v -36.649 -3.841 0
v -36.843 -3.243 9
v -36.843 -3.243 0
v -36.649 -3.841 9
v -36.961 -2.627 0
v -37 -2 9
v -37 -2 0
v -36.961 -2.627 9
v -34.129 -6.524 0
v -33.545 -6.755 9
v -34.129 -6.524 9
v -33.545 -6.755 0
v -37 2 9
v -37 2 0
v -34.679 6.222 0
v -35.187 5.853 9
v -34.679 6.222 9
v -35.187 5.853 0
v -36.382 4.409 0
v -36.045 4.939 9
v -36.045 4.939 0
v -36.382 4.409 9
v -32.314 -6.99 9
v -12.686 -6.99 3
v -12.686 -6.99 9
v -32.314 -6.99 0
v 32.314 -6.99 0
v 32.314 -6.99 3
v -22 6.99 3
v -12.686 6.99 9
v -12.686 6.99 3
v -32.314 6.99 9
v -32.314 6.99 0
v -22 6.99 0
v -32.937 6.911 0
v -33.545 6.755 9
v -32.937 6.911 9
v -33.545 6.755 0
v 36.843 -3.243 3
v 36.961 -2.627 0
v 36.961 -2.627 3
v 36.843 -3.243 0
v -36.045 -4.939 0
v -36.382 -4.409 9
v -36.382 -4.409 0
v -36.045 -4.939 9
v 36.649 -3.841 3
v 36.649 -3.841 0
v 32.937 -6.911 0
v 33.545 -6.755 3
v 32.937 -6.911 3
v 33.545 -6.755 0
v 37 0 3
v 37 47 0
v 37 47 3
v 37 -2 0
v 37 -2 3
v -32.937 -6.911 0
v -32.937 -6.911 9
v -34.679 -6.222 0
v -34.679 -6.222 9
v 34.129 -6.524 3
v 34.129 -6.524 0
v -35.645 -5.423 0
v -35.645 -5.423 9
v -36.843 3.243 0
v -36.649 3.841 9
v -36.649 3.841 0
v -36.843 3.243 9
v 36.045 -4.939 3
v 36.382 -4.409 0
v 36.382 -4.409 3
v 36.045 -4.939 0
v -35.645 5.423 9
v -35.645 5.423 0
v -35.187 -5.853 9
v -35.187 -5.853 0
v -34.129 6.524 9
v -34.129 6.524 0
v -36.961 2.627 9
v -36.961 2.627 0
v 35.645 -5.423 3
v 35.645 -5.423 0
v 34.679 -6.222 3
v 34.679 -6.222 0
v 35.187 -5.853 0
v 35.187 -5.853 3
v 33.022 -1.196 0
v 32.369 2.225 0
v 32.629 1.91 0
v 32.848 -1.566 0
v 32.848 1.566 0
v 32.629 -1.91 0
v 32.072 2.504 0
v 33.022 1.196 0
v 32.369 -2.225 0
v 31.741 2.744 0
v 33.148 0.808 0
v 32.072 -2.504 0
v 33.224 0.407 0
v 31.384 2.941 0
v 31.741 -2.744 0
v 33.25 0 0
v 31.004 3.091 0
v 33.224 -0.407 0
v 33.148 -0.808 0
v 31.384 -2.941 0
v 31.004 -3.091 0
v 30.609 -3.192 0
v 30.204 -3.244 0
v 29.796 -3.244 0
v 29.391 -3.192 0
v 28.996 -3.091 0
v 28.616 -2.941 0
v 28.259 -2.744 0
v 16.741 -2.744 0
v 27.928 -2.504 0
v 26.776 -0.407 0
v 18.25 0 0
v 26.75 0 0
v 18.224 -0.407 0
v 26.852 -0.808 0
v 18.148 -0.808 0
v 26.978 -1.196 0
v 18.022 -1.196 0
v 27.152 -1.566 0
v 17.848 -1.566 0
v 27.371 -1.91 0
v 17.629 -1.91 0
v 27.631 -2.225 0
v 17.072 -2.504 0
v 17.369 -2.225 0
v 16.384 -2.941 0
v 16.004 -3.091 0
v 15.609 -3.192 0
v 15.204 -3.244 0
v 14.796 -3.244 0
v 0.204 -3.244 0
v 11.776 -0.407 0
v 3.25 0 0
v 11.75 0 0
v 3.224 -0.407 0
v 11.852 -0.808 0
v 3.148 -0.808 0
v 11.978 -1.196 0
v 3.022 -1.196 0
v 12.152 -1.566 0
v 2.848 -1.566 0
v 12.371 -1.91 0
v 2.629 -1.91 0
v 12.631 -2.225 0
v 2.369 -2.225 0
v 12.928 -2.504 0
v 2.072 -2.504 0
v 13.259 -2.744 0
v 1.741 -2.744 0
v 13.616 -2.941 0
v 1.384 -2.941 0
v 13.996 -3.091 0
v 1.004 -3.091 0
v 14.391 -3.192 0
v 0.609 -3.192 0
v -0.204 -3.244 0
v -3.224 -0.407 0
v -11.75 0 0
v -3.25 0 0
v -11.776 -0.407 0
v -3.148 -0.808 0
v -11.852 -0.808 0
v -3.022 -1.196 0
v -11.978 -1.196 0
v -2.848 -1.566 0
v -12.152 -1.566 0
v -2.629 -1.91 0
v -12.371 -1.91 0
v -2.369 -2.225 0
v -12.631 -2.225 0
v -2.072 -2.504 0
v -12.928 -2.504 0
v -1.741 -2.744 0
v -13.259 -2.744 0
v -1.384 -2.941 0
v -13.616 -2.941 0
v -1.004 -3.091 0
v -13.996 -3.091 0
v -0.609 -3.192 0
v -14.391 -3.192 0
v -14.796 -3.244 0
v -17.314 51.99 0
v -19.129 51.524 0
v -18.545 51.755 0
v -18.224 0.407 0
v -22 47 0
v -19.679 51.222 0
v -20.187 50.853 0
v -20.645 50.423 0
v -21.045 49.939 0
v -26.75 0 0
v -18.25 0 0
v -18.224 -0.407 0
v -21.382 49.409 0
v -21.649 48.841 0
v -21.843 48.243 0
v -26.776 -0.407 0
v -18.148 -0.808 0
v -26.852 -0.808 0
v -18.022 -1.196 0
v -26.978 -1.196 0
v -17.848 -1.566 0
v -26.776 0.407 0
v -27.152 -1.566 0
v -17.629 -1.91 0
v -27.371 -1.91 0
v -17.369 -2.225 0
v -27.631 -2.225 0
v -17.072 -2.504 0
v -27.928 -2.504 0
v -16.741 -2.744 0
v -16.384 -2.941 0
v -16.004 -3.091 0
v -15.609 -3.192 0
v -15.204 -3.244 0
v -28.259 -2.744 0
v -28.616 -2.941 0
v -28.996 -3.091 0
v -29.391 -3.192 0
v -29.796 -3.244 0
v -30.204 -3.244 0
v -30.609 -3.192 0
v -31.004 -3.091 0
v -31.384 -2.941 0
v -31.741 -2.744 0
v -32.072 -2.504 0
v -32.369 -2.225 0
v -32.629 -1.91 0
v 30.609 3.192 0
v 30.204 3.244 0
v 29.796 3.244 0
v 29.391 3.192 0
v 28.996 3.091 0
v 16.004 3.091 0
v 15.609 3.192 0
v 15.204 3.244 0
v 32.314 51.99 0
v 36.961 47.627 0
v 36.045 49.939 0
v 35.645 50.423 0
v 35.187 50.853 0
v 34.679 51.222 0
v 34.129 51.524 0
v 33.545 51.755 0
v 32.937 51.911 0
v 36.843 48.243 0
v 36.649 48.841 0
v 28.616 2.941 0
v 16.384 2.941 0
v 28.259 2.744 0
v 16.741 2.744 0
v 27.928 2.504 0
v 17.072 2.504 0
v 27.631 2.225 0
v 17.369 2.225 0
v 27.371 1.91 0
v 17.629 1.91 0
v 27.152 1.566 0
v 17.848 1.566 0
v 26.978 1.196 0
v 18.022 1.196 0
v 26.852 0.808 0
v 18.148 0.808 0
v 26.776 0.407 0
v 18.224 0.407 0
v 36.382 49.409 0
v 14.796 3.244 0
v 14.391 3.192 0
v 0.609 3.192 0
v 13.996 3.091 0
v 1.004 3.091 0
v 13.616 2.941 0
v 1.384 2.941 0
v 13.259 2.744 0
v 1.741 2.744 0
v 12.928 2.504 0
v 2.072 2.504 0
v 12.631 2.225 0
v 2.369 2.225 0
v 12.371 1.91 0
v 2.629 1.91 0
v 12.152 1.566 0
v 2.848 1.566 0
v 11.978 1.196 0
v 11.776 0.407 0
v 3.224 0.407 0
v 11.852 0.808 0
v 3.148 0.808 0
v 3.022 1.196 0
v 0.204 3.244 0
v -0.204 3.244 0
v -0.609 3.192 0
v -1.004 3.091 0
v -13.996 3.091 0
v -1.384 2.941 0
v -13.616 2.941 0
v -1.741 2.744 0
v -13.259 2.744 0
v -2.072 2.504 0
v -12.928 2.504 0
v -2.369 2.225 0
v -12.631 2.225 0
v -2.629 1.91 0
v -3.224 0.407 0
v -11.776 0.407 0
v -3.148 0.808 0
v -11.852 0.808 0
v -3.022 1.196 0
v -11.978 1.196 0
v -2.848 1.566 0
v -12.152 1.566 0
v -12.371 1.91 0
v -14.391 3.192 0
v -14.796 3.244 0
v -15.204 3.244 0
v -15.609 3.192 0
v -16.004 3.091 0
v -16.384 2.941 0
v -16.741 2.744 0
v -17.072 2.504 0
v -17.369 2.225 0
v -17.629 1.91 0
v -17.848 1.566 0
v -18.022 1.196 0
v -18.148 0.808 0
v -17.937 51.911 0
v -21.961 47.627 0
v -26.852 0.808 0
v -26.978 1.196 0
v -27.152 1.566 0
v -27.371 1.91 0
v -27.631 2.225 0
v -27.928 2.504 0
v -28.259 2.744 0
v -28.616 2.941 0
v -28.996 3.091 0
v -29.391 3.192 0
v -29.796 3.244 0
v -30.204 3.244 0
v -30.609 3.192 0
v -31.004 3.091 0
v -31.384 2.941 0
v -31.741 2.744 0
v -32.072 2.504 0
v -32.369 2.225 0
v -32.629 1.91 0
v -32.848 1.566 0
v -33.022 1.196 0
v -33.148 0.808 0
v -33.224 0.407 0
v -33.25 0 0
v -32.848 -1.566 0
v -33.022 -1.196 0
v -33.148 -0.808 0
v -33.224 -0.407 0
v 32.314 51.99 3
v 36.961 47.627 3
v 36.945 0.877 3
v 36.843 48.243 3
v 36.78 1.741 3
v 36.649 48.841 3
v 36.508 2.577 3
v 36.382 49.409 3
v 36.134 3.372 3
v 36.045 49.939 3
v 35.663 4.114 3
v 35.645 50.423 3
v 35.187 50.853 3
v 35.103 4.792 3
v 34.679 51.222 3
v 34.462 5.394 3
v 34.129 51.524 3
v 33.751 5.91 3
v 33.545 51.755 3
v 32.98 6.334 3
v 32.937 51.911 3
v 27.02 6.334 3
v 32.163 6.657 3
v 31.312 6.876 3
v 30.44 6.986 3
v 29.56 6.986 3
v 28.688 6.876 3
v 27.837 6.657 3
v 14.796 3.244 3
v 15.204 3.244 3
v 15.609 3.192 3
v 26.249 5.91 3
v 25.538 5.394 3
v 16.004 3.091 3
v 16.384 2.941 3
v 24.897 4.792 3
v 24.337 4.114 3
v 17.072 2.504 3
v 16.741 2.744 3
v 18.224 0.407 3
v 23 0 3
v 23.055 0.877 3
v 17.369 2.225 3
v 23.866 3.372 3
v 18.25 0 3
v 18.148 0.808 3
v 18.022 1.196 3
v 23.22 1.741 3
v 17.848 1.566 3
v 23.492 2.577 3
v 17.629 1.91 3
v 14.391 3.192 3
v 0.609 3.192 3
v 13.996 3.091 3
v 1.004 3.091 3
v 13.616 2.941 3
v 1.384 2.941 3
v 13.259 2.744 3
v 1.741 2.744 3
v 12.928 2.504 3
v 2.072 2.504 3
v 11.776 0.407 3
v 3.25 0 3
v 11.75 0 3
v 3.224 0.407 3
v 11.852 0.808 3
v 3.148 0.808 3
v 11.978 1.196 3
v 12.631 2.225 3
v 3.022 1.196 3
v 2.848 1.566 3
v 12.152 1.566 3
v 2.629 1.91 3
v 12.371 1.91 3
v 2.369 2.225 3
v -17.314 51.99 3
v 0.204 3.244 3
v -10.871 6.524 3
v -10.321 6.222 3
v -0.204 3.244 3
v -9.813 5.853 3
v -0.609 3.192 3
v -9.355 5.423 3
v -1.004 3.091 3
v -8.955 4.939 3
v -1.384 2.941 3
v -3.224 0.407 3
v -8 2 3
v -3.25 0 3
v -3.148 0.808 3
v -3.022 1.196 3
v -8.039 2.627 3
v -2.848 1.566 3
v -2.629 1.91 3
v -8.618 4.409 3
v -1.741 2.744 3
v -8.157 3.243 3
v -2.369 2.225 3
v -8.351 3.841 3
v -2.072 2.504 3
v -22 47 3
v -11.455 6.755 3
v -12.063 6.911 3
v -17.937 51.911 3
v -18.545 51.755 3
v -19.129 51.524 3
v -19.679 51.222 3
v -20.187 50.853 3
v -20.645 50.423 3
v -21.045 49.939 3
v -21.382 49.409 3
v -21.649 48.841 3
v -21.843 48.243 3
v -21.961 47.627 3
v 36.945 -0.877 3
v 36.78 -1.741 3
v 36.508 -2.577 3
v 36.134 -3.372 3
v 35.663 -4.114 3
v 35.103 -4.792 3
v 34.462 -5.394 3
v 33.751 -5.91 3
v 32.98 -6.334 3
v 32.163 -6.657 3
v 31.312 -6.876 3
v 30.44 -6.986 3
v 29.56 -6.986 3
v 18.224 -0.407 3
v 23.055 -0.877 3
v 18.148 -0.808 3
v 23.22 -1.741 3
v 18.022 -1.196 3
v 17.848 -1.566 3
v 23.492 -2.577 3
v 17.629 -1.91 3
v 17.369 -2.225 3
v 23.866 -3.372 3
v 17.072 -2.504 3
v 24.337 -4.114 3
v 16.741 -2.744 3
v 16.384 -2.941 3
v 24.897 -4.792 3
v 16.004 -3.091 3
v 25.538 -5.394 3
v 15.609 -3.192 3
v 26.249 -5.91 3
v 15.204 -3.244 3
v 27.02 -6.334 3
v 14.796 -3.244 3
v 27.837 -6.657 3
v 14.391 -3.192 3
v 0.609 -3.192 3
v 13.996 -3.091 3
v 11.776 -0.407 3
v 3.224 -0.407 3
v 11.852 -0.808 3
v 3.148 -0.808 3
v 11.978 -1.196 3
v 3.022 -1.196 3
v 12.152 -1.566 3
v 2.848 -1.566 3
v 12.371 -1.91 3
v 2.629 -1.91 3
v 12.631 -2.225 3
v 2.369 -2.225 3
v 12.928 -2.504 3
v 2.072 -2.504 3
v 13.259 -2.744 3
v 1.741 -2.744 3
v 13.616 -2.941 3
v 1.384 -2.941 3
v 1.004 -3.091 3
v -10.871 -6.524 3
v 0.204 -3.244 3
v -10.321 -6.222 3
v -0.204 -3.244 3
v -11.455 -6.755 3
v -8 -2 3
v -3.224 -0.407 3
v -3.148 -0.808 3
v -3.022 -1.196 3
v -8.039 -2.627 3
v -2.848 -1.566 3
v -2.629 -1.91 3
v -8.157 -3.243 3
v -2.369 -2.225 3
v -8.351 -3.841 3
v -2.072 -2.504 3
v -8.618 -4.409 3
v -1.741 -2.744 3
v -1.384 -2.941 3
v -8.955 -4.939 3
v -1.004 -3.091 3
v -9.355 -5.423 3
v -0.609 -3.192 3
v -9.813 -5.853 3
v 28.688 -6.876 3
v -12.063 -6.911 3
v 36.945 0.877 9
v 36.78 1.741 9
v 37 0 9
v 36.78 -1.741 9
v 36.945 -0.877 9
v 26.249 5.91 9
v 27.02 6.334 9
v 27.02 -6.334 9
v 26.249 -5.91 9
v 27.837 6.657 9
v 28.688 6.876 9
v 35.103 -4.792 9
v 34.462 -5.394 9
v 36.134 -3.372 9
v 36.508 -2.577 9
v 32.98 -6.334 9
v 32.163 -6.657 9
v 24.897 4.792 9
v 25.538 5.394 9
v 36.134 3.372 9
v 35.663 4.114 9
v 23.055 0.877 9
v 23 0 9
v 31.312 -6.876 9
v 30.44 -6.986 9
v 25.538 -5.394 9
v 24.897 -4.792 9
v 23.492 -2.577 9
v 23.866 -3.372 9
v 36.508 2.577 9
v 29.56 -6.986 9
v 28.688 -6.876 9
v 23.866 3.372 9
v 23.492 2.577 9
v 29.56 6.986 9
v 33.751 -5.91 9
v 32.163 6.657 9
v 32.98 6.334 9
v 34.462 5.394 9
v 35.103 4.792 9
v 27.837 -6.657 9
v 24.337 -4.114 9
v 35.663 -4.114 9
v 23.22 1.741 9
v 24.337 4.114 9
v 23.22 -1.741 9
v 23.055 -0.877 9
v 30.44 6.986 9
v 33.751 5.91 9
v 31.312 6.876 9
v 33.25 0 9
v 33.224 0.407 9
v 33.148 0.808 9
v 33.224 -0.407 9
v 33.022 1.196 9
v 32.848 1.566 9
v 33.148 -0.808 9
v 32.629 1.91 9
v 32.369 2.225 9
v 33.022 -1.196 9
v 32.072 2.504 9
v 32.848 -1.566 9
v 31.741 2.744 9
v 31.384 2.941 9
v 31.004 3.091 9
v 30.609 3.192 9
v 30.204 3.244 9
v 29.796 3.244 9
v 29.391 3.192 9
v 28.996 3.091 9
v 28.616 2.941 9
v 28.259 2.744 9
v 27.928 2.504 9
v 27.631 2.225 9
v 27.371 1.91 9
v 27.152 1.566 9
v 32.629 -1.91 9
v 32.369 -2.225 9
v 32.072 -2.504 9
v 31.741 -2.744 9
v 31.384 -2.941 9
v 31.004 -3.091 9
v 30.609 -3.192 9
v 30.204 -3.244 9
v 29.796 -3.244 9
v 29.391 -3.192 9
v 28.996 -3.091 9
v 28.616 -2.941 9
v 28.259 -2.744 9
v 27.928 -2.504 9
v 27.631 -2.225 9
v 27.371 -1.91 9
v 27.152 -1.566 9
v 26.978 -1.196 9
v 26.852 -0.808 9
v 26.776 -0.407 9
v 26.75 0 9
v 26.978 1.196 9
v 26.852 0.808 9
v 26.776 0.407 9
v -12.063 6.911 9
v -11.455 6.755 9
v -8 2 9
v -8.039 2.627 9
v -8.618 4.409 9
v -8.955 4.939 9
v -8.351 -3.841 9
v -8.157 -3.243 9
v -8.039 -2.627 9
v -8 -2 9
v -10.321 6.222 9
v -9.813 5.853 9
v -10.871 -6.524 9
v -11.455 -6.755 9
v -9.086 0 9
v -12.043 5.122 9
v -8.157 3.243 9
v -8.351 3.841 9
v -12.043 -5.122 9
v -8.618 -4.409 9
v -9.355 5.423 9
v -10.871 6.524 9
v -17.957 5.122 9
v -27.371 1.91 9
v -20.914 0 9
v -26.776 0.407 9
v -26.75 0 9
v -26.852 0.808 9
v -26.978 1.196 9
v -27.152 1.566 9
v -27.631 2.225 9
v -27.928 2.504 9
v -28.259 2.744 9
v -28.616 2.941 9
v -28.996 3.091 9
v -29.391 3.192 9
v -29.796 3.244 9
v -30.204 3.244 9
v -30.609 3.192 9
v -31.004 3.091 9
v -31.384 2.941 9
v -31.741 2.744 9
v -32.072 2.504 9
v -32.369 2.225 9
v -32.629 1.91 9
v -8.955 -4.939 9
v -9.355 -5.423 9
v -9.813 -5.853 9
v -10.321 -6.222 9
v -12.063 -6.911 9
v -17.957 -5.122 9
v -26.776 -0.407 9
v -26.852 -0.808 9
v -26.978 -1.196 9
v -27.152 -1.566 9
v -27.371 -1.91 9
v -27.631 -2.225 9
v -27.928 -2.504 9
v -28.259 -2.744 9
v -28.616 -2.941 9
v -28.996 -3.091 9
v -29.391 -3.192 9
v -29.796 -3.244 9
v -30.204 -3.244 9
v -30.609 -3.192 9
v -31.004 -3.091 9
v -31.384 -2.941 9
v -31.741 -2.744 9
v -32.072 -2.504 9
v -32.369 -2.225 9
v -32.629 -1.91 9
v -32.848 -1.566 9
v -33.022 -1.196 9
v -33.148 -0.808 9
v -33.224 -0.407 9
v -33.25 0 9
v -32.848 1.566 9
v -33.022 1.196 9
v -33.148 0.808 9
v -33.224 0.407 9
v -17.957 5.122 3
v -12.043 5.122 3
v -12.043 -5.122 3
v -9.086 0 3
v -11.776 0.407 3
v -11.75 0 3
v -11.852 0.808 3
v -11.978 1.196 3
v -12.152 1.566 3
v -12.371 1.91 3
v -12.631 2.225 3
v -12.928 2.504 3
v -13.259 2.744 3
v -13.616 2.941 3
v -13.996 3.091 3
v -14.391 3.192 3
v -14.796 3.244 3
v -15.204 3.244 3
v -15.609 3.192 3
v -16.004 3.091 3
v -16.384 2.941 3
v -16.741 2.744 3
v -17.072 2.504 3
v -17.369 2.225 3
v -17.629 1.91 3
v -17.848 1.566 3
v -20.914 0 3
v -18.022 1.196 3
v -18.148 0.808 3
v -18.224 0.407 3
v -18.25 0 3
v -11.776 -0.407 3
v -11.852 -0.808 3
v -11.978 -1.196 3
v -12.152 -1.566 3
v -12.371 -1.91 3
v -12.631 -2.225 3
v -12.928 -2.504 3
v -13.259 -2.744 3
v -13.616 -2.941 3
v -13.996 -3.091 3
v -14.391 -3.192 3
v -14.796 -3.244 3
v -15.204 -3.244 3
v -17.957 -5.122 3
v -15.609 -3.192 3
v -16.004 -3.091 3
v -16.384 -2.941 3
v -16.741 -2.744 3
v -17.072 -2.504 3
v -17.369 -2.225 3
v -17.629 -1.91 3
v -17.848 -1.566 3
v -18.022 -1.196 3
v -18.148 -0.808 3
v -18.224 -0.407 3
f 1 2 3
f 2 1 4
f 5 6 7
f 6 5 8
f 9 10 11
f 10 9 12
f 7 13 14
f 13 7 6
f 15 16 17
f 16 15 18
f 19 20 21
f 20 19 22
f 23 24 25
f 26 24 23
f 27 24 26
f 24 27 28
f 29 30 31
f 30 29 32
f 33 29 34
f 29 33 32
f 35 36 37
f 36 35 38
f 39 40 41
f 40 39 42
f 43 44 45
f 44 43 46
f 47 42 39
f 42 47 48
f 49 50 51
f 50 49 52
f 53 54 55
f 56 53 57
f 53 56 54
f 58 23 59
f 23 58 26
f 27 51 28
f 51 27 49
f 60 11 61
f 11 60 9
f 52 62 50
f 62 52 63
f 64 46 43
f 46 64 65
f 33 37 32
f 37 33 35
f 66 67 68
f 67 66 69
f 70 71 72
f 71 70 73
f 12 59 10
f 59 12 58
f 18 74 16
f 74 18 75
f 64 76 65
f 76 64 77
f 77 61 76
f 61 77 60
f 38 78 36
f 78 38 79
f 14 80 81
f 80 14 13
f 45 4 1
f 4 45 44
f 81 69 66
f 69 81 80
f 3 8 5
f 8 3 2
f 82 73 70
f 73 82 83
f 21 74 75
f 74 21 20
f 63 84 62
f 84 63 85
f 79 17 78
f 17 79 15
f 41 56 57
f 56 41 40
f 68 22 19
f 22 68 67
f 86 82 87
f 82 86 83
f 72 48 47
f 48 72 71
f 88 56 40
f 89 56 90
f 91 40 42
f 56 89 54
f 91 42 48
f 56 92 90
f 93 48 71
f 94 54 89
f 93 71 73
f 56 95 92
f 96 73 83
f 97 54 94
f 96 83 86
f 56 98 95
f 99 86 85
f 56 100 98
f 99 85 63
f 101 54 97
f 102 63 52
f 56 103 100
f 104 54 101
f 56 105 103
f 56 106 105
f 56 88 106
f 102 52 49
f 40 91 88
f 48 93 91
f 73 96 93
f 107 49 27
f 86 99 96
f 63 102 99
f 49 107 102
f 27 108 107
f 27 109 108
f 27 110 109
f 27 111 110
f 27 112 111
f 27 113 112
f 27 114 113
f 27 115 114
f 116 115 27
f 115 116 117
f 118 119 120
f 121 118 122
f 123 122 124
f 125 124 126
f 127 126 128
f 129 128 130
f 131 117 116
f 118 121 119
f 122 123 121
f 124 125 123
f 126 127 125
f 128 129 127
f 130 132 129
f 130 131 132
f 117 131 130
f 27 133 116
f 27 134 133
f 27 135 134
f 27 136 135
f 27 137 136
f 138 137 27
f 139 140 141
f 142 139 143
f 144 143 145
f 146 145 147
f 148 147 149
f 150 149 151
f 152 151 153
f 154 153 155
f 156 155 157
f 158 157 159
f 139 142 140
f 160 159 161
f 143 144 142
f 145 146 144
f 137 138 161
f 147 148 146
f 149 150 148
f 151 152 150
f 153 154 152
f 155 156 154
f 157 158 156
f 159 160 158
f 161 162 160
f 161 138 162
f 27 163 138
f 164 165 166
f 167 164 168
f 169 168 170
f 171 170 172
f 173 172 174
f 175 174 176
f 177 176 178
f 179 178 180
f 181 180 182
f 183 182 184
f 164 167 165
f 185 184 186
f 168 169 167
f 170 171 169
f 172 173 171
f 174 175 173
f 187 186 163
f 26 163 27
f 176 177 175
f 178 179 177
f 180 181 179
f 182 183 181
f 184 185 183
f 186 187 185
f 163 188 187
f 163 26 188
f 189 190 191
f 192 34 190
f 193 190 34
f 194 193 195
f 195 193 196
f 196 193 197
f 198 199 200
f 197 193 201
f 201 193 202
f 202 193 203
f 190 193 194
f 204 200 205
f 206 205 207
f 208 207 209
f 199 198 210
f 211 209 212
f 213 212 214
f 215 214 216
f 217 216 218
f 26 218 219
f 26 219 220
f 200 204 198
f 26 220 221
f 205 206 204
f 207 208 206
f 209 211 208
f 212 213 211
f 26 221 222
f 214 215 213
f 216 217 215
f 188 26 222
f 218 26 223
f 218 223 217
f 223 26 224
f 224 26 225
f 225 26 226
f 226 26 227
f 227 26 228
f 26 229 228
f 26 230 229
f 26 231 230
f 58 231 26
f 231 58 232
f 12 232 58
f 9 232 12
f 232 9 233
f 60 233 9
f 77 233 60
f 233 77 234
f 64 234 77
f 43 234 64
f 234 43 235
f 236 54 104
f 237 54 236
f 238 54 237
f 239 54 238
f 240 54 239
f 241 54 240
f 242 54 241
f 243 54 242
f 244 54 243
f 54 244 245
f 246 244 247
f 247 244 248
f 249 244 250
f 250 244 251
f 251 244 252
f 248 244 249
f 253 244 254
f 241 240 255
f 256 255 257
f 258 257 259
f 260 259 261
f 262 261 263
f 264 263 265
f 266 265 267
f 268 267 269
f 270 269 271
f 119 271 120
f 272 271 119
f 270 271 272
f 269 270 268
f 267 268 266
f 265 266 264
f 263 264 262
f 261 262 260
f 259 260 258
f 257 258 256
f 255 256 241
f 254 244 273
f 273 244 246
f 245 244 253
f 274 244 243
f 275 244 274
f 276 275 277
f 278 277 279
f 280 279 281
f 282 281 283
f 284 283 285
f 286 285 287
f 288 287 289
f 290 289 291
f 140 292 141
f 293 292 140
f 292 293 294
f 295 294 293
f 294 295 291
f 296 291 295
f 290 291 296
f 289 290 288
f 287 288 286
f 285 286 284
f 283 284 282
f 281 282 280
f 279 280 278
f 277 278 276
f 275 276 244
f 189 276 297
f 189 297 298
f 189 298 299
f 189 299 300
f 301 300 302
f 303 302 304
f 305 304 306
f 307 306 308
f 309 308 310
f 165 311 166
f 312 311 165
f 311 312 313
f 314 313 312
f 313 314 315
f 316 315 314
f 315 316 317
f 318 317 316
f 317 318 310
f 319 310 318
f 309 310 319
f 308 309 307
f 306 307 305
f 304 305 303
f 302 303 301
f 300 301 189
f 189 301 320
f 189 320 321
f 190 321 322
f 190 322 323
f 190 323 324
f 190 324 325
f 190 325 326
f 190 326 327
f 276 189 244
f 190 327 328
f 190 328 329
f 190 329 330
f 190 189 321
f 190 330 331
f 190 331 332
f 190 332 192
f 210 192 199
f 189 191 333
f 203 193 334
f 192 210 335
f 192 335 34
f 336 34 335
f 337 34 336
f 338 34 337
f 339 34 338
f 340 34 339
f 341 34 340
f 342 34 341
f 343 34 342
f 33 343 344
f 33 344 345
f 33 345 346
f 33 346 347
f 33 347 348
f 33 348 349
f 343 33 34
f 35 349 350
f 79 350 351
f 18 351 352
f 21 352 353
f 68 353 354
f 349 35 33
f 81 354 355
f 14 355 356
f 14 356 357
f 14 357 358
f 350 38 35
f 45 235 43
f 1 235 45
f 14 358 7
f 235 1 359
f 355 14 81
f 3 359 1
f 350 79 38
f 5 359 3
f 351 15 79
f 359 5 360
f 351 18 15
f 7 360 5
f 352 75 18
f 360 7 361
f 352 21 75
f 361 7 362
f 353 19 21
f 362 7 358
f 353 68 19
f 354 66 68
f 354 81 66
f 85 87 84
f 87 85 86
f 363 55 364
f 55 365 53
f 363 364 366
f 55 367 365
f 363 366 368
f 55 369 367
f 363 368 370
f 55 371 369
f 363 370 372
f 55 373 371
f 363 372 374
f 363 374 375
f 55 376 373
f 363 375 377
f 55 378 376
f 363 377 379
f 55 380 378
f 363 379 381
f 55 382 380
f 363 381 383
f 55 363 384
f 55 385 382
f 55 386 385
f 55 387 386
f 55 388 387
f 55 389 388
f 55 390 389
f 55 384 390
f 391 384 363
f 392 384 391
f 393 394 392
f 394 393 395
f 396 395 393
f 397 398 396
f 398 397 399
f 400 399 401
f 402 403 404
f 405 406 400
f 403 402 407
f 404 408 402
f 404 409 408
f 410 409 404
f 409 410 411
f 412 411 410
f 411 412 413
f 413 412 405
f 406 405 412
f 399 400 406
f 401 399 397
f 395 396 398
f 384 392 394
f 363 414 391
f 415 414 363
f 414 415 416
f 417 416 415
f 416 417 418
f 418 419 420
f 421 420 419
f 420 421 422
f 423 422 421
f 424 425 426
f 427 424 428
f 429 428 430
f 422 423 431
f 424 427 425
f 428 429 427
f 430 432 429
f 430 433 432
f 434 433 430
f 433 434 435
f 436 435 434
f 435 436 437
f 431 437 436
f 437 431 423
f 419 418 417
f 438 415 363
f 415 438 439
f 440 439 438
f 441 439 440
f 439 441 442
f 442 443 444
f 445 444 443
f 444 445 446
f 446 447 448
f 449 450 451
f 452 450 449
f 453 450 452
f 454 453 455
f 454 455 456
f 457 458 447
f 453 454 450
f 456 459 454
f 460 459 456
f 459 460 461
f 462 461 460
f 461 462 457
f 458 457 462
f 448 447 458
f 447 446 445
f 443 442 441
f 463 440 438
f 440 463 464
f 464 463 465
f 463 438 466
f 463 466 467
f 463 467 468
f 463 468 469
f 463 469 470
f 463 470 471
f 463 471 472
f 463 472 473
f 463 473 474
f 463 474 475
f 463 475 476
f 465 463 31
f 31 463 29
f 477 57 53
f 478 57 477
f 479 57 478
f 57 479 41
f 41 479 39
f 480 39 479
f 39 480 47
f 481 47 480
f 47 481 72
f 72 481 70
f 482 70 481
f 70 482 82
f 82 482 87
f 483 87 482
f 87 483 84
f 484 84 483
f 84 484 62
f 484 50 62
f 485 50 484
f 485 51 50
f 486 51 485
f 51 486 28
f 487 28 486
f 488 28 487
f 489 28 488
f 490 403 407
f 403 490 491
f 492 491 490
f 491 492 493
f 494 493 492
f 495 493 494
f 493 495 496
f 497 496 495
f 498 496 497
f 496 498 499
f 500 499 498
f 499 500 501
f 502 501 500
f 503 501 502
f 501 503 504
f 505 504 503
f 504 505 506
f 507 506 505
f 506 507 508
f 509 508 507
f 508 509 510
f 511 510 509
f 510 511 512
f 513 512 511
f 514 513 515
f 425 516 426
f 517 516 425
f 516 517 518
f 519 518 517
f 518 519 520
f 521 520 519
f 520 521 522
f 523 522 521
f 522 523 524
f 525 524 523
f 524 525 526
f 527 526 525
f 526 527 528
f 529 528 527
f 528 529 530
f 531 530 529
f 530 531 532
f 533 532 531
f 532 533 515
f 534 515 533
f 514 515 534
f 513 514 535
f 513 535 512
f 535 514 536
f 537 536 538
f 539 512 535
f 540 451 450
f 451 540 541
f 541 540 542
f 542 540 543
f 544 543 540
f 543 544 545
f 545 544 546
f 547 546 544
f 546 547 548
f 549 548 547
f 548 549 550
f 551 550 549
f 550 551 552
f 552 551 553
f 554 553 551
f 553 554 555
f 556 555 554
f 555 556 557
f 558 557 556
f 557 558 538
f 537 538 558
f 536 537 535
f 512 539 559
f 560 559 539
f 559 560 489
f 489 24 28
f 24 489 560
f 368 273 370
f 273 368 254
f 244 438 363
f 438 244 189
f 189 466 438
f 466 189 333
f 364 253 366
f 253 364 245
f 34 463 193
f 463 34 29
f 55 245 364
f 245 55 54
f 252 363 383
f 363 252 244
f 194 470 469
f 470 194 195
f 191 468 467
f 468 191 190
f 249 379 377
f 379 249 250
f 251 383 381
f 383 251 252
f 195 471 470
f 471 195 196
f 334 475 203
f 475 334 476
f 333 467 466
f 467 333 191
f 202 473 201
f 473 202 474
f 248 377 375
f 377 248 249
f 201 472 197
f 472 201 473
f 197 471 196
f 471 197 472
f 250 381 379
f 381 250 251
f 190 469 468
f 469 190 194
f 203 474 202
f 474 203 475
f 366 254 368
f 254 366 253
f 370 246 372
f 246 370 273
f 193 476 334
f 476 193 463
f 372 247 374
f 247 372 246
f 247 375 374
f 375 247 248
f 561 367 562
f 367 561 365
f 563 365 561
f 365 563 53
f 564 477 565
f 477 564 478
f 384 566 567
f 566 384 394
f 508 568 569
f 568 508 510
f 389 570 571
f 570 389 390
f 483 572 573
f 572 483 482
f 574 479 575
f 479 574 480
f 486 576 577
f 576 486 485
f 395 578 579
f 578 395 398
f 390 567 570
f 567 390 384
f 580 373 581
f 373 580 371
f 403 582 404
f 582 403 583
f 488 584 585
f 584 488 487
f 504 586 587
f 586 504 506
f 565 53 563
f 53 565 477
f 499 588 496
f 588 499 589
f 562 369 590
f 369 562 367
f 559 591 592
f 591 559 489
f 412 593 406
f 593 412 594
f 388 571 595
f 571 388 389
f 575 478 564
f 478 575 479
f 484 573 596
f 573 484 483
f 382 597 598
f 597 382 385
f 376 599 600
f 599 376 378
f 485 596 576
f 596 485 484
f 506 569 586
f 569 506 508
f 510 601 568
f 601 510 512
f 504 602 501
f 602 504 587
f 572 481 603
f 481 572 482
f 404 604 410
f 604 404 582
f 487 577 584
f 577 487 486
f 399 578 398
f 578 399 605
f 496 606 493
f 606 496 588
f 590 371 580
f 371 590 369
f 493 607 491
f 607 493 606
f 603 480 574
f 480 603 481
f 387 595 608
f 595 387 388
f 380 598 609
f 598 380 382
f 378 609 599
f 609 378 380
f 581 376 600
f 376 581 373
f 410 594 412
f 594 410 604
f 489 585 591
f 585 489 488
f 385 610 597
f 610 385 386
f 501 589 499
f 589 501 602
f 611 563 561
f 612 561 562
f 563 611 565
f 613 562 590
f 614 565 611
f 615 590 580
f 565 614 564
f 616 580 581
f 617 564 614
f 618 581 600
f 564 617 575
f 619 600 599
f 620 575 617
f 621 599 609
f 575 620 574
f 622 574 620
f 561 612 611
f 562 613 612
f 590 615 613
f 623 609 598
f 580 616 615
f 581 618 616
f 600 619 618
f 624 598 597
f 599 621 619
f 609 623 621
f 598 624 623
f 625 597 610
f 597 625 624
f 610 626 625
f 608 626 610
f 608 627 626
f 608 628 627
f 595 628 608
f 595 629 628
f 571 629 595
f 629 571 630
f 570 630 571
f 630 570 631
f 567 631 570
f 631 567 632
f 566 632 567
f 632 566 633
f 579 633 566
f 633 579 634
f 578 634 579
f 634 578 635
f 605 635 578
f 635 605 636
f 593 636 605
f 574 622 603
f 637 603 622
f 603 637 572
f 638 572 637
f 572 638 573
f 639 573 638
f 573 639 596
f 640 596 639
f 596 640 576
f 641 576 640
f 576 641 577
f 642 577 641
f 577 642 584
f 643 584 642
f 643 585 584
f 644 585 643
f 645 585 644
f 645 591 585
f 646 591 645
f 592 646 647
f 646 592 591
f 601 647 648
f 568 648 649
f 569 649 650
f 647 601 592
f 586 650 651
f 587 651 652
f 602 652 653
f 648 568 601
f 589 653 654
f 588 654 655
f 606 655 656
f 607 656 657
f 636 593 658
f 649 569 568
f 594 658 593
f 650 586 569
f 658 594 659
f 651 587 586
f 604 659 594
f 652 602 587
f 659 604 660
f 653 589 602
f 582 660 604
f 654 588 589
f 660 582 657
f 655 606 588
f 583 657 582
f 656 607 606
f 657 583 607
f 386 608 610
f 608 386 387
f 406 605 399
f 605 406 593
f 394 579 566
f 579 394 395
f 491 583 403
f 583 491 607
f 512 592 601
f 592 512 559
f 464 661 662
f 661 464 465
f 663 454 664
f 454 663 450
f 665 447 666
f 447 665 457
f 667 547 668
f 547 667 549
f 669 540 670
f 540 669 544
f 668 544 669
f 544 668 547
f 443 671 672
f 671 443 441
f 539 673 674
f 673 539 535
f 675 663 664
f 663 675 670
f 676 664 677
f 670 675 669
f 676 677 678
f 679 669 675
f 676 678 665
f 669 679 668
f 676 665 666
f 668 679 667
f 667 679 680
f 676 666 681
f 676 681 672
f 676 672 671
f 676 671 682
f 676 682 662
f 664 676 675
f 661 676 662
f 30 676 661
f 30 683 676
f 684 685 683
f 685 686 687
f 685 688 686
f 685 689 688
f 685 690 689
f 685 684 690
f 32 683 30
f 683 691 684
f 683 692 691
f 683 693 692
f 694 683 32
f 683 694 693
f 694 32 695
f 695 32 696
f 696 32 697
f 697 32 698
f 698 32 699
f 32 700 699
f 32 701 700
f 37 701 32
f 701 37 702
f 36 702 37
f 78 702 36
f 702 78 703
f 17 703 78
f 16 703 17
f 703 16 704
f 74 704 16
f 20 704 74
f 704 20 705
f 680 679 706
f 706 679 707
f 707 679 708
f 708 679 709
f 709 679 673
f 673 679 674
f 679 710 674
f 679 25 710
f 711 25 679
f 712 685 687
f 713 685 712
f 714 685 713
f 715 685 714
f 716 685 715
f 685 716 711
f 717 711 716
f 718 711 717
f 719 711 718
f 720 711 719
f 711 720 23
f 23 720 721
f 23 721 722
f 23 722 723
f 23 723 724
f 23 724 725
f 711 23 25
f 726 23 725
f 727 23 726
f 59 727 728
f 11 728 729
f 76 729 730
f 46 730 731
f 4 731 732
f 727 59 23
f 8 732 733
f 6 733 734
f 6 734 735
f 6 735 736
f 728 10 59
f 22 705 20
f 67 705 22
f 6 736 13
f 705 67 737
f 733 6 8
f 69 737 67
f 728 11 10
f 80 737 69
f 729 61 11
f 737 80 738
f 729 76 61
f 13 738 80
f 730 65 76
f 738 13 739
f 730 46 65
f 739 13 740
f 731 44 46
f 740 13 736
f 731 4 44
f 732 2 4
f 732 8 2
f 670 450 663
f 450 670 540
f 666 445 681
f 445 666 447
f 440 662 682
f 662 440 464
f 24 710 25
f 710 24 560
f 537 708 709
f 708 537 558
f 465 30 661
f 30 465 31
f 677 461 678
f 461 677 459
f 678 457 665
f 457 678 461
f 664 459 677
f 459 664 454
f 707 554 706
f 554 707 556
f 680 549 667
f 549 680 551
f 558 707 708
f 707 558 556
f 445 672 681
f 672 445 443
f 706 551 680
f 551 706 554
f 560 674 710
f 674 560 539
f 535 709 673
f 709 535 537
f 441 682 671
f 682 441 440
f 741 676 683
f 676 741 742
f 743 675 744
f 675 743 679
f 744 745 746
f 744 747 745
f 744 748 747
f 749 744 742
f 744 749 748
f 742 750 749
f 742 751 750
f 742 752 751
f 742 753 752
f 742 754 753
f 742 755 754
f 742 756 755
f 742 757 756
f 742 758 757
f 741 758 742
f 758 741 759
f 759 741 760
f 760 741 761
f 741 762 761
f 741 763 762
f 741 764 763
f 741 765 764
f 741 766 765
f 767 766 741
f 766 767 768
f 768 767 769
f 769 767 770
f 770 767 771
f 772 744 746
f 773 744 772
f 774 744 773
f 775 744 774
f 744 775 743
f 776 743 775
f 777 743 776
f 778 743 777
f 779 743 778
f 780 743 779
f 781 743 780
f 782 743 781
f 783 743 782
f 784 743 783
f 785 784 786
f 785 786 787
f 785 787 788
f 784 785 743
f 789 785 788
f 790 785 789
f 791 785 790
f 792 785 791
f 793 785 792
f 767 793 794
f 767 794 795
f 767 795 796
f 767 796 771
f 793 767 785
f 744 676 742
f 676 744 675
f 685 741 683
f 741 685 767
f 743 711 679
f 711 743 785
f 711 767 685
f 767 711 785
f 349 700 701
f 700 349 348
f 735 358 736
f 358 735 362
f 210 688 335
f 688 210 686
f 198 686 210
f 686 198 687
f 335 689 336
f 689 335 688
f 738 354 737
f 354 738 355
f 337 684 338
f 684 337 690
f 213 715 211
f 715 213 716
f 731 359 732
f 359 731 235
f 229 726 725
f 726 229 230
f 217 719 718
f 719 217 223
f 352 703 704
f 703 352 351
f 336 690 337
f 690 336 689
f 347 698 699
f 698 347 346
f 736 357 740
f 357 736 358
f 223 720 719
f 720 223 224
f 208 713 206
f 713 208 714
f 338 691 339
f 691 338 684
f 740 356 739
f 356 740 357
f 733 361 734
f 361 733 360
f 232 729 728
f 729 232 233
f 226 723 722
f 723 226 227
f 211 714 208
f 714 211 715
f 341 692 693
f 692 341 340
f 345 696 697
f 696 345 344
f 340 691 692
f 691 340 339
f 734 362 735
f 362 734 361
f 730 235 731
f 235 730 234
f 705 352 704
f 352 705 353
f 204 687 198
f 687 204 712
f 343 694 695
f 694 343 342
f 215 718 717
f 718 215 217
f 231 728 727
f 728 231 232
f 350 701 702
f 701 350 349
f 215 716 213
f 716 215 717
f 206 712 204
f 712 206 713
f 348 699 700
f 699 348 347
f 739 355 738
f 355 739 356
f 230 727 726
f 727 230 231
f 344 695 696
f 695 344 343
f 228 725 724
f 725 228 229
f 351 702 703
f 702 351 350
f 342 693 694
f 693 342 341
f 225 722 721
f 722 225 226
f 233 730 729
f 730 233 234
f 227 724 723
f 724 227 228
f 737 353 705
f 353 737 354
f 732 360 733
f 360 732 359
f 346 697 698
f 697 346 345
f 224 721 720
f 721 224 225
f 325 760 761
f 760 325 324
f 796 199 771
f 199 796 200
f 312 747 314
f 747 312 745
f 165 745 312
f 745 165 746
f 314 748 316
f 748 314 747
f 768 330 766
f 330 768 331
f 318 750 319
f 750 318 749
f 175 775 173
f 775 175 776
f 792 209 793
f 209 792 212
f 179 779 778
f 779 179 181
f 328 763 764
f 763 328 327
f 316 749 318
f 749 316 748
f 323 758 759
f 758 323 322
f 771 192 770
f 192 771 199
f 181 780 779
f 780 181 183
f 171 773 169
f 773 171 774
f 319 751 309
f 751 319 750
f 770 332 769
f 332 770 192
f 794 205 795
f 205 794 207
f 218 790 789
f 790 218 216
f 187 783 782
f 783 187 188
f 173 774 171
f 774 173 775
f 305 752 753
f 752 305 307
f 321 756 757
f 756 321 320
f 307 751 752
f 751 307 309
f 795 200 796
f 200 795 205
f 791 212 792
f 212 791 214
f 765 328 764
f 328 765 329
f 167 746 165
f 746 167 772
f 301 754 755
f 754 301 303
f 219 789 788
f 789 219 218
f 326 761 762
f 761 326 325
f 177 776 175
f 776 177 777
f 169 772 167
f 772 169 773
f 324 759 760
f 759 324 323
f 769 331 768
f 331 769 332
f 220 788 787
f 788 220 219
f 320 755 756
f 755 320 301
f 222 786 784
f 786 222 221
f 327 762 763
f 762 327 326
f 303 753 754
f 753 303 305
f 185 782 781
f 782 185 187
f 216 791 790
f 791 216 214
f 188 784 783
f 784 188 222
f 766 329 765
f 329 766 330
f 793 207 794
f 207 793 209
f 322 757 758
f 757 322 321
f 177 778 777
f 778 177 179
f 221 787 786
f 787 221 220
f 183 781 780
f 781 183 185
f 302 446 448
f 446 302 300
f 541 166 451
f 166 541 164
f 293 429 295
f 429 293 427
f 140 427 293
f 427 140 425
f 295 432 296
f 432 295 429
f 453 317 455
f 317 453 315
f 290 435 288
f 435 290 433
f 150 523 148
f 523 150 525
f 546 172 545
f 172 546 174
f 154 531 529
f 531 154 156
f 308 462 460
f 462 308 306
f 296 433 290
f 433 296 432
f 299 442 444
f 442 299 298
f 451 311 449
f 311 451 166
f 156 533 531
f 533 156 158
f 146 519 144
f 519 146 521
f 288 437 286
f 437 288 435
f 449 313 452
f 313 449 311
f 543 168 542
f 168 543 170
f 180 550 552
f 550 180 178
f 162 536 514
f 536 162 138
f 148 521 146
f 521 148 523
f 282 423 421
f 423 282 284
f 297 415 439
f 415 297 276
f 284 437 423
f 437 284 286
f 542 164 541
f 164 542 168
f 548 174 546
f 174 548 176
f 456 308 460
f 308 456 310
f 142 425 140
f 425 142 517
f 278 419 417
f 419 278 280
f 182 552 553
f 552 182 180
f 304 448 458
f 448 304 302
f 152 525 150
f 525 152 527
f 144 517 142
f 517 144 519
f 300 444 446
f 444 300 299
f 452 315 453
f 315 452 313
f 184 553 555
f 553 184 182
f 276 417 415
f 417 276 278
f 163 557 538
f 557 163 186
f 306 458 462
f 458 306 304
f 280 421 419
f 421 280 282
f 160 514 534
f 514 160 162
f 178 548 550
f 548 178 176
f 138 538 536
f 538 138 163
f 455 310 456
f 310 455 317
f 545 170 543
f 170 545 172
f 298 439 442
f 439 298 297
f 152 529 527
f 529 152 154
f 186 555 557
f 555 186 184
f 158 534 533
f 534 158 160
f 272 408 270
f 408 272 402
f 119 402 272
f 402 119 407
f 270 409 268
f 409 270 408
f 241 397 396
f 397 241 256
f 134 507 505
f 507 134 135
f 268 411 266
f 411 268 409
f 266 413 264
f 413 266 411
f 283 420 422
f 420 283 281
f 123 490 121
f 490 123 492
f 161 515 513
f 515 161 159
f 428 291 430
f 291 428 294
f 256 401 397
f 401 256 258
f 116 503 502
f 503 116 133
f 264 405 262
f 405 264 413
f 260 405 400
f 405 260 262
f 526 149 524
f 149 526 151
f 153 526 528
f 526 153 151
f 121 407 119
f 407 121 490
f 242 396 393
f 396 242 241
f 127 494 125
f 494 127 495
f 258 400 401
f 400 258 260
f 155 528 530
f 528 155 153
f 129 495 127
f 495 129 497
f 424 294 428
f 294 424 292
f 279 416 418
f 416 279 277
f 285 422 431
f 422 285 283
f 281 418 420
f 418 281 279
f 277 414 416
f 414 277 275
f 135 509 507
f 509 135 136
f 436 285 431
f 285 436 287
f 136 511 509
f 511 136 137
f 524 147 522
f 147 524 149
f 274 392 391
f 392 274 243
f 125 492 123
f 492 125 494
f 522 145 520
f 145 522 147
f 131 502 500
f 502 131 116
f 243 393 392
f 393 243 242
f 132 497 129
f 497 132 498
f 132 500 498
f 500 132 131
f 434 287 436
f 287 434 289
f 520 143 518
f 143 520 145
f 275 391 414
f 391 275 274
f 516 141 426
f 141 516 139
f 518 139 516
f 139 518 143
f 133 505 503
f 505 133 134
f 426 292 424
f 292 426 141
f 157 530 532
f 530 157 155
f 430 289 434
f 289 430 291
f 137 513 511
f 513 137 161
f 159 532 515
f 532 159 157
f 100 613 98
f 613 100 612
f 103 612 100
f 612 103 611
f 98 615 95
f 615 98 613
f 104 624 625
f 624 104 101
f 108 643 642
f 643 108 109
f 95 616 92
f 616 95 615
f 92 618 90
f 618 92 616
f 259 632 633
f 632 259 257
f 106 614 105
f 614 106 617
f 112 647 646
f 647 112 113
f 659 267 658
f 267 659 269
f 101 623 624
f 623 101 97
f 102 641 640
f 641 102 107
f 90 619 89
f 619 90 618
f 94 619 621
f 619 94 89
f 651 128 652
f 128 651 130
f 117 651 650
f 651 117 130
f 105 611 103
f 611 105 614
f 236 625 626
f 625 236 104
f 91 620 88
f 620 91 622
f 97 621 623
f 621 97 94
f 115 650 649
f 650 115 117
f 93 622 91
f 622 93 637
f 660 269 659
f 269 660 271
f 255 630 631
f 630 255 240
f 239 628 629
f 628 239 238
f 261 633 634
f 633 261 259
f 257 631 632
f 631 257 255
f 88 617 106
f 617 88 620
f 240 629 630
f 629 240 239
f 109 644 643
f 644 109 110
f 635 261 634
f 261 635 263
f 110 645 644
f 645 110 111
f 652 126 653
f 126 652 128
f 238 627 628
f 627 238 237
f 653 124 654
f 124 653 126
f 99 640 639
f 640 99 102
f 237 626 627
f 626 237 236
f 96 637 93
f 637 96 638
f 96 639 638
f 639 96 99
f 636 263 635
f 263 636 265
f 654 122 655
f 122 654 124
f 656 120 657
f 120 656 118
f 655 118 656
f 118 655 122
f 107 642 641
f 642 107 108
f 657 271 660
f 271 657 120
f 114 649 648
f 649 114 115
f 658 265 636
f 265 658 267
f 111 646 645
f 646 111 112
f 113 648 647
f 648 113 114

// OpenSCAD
$fn = 50;


difference() {
	union() {
		hull() {
			translate(v = [-32.0000000000, 2.0000000000, 0]) {
				cylinder(h = 3, r = 5);
			}
			translate(v = [32.0000000000, 2.0000000000, 0]) {
				cylinder(h = 3, r = 5);
			}
			translate(v = [-32.0000000000, -2.0000000000, 0]) {
				cylinder(h = 3, r = 5);
			}
			translate(v = [32.0000000000, -2.0000000000, 0]) {
				cylinder(h = 3, r = 5);
			}
		}
		translate(v = [7.5000000000, 22.5000000000, 0]) {
			hull() {
				translate(v = [-24.5000000000, 24.5000000000, 0]) {
					cylinder(h = 3, r = 5);
				}
				translate(v = [24.5000000000, 24.5000000000, 0]) {
					cylinder(h = 3, r = 5);
				}
				translate(v = [-24.5000000000, -24.5000000000, 0]) {
					cylinder(h = 3, r = 5);
				}
				translate(v = [24.5000000000, -24.5000000000, 0]) {
					cylinder(h = 3, r = 5);
				}
			}
		}
		translate(v = [30.0000000000, 0, 0]) {
			cylinder(h = 9, r = 7.0000000000);
		}
		translate(v = [-22.5000000000, 0, 0]) {
			hull() {
				translate(v = [-9.5000000000, 2.0000000000, 0]) {
					cylinder(h = 9, r = 5);
				}
				translate(v = [9.5000000000, 2.0000000000, 0]) {
					cylinder(h = 9, r = 5);
				}
				translate(v = [-9.5000000000, -2.0000000000, 0]) {
					cylinder(h = 9, r = 5);
				}
				translate(v = [9.5000000000, -2.0000000000, 0]) {
					cylinder(h = 9, r = 5);
				}
			}
		}
	}
	union() {
		translate(v = [-15.0000000000, 0, 9]) {
			rotate(a = [0, 0, 0]) {
				difference() {
					union() {
						translate(v = [0, 0, -6]) {
							linear_extrude(height = 6) {
								polygon(points = [[5.9142500000, 0.0000000000], [2.9571250000, 5.1218907443], [-2.9571250000, 5.1218907443], [-5.9142500000, 0.0000000000], [-2.9571250000, -5.1218907443], [2.9571250000, -5.1218907443]]);
							}
						}
					}
					union();
				}
			}
		}
		translate(v = [-30.0000000000, 0.0000000000, 0]) {
			translate(v = [0, 0, -100]) {
				cylinder(h = 200, r = 3.2500000000);
			}
		}
		translate(v = [-15.0000000000, 0.0000000000, 0]) {
			translate(v = [0, 0, -100]) {
				cylinder(h = 200, r = 3.2500000000);
			}
		}
		translate(v = [0, 0, -100]) {
			cylinder(h = 200, r = 3.2500000000);
		}
		translate(v = [15.0000000000, 0.0000000000, 0]) {
			translate(v = [0, 0, -100]) {
				cylinder(h = 200, r = 3.2500000000);
			}
		}
		translate(v = [30.0000000000, 0.0000000000, 0]) {
			translate(v = [0, 0, -100]) {
				cylinder(h = 200, r = 3.2500000000);
			}
		}
	}
}
